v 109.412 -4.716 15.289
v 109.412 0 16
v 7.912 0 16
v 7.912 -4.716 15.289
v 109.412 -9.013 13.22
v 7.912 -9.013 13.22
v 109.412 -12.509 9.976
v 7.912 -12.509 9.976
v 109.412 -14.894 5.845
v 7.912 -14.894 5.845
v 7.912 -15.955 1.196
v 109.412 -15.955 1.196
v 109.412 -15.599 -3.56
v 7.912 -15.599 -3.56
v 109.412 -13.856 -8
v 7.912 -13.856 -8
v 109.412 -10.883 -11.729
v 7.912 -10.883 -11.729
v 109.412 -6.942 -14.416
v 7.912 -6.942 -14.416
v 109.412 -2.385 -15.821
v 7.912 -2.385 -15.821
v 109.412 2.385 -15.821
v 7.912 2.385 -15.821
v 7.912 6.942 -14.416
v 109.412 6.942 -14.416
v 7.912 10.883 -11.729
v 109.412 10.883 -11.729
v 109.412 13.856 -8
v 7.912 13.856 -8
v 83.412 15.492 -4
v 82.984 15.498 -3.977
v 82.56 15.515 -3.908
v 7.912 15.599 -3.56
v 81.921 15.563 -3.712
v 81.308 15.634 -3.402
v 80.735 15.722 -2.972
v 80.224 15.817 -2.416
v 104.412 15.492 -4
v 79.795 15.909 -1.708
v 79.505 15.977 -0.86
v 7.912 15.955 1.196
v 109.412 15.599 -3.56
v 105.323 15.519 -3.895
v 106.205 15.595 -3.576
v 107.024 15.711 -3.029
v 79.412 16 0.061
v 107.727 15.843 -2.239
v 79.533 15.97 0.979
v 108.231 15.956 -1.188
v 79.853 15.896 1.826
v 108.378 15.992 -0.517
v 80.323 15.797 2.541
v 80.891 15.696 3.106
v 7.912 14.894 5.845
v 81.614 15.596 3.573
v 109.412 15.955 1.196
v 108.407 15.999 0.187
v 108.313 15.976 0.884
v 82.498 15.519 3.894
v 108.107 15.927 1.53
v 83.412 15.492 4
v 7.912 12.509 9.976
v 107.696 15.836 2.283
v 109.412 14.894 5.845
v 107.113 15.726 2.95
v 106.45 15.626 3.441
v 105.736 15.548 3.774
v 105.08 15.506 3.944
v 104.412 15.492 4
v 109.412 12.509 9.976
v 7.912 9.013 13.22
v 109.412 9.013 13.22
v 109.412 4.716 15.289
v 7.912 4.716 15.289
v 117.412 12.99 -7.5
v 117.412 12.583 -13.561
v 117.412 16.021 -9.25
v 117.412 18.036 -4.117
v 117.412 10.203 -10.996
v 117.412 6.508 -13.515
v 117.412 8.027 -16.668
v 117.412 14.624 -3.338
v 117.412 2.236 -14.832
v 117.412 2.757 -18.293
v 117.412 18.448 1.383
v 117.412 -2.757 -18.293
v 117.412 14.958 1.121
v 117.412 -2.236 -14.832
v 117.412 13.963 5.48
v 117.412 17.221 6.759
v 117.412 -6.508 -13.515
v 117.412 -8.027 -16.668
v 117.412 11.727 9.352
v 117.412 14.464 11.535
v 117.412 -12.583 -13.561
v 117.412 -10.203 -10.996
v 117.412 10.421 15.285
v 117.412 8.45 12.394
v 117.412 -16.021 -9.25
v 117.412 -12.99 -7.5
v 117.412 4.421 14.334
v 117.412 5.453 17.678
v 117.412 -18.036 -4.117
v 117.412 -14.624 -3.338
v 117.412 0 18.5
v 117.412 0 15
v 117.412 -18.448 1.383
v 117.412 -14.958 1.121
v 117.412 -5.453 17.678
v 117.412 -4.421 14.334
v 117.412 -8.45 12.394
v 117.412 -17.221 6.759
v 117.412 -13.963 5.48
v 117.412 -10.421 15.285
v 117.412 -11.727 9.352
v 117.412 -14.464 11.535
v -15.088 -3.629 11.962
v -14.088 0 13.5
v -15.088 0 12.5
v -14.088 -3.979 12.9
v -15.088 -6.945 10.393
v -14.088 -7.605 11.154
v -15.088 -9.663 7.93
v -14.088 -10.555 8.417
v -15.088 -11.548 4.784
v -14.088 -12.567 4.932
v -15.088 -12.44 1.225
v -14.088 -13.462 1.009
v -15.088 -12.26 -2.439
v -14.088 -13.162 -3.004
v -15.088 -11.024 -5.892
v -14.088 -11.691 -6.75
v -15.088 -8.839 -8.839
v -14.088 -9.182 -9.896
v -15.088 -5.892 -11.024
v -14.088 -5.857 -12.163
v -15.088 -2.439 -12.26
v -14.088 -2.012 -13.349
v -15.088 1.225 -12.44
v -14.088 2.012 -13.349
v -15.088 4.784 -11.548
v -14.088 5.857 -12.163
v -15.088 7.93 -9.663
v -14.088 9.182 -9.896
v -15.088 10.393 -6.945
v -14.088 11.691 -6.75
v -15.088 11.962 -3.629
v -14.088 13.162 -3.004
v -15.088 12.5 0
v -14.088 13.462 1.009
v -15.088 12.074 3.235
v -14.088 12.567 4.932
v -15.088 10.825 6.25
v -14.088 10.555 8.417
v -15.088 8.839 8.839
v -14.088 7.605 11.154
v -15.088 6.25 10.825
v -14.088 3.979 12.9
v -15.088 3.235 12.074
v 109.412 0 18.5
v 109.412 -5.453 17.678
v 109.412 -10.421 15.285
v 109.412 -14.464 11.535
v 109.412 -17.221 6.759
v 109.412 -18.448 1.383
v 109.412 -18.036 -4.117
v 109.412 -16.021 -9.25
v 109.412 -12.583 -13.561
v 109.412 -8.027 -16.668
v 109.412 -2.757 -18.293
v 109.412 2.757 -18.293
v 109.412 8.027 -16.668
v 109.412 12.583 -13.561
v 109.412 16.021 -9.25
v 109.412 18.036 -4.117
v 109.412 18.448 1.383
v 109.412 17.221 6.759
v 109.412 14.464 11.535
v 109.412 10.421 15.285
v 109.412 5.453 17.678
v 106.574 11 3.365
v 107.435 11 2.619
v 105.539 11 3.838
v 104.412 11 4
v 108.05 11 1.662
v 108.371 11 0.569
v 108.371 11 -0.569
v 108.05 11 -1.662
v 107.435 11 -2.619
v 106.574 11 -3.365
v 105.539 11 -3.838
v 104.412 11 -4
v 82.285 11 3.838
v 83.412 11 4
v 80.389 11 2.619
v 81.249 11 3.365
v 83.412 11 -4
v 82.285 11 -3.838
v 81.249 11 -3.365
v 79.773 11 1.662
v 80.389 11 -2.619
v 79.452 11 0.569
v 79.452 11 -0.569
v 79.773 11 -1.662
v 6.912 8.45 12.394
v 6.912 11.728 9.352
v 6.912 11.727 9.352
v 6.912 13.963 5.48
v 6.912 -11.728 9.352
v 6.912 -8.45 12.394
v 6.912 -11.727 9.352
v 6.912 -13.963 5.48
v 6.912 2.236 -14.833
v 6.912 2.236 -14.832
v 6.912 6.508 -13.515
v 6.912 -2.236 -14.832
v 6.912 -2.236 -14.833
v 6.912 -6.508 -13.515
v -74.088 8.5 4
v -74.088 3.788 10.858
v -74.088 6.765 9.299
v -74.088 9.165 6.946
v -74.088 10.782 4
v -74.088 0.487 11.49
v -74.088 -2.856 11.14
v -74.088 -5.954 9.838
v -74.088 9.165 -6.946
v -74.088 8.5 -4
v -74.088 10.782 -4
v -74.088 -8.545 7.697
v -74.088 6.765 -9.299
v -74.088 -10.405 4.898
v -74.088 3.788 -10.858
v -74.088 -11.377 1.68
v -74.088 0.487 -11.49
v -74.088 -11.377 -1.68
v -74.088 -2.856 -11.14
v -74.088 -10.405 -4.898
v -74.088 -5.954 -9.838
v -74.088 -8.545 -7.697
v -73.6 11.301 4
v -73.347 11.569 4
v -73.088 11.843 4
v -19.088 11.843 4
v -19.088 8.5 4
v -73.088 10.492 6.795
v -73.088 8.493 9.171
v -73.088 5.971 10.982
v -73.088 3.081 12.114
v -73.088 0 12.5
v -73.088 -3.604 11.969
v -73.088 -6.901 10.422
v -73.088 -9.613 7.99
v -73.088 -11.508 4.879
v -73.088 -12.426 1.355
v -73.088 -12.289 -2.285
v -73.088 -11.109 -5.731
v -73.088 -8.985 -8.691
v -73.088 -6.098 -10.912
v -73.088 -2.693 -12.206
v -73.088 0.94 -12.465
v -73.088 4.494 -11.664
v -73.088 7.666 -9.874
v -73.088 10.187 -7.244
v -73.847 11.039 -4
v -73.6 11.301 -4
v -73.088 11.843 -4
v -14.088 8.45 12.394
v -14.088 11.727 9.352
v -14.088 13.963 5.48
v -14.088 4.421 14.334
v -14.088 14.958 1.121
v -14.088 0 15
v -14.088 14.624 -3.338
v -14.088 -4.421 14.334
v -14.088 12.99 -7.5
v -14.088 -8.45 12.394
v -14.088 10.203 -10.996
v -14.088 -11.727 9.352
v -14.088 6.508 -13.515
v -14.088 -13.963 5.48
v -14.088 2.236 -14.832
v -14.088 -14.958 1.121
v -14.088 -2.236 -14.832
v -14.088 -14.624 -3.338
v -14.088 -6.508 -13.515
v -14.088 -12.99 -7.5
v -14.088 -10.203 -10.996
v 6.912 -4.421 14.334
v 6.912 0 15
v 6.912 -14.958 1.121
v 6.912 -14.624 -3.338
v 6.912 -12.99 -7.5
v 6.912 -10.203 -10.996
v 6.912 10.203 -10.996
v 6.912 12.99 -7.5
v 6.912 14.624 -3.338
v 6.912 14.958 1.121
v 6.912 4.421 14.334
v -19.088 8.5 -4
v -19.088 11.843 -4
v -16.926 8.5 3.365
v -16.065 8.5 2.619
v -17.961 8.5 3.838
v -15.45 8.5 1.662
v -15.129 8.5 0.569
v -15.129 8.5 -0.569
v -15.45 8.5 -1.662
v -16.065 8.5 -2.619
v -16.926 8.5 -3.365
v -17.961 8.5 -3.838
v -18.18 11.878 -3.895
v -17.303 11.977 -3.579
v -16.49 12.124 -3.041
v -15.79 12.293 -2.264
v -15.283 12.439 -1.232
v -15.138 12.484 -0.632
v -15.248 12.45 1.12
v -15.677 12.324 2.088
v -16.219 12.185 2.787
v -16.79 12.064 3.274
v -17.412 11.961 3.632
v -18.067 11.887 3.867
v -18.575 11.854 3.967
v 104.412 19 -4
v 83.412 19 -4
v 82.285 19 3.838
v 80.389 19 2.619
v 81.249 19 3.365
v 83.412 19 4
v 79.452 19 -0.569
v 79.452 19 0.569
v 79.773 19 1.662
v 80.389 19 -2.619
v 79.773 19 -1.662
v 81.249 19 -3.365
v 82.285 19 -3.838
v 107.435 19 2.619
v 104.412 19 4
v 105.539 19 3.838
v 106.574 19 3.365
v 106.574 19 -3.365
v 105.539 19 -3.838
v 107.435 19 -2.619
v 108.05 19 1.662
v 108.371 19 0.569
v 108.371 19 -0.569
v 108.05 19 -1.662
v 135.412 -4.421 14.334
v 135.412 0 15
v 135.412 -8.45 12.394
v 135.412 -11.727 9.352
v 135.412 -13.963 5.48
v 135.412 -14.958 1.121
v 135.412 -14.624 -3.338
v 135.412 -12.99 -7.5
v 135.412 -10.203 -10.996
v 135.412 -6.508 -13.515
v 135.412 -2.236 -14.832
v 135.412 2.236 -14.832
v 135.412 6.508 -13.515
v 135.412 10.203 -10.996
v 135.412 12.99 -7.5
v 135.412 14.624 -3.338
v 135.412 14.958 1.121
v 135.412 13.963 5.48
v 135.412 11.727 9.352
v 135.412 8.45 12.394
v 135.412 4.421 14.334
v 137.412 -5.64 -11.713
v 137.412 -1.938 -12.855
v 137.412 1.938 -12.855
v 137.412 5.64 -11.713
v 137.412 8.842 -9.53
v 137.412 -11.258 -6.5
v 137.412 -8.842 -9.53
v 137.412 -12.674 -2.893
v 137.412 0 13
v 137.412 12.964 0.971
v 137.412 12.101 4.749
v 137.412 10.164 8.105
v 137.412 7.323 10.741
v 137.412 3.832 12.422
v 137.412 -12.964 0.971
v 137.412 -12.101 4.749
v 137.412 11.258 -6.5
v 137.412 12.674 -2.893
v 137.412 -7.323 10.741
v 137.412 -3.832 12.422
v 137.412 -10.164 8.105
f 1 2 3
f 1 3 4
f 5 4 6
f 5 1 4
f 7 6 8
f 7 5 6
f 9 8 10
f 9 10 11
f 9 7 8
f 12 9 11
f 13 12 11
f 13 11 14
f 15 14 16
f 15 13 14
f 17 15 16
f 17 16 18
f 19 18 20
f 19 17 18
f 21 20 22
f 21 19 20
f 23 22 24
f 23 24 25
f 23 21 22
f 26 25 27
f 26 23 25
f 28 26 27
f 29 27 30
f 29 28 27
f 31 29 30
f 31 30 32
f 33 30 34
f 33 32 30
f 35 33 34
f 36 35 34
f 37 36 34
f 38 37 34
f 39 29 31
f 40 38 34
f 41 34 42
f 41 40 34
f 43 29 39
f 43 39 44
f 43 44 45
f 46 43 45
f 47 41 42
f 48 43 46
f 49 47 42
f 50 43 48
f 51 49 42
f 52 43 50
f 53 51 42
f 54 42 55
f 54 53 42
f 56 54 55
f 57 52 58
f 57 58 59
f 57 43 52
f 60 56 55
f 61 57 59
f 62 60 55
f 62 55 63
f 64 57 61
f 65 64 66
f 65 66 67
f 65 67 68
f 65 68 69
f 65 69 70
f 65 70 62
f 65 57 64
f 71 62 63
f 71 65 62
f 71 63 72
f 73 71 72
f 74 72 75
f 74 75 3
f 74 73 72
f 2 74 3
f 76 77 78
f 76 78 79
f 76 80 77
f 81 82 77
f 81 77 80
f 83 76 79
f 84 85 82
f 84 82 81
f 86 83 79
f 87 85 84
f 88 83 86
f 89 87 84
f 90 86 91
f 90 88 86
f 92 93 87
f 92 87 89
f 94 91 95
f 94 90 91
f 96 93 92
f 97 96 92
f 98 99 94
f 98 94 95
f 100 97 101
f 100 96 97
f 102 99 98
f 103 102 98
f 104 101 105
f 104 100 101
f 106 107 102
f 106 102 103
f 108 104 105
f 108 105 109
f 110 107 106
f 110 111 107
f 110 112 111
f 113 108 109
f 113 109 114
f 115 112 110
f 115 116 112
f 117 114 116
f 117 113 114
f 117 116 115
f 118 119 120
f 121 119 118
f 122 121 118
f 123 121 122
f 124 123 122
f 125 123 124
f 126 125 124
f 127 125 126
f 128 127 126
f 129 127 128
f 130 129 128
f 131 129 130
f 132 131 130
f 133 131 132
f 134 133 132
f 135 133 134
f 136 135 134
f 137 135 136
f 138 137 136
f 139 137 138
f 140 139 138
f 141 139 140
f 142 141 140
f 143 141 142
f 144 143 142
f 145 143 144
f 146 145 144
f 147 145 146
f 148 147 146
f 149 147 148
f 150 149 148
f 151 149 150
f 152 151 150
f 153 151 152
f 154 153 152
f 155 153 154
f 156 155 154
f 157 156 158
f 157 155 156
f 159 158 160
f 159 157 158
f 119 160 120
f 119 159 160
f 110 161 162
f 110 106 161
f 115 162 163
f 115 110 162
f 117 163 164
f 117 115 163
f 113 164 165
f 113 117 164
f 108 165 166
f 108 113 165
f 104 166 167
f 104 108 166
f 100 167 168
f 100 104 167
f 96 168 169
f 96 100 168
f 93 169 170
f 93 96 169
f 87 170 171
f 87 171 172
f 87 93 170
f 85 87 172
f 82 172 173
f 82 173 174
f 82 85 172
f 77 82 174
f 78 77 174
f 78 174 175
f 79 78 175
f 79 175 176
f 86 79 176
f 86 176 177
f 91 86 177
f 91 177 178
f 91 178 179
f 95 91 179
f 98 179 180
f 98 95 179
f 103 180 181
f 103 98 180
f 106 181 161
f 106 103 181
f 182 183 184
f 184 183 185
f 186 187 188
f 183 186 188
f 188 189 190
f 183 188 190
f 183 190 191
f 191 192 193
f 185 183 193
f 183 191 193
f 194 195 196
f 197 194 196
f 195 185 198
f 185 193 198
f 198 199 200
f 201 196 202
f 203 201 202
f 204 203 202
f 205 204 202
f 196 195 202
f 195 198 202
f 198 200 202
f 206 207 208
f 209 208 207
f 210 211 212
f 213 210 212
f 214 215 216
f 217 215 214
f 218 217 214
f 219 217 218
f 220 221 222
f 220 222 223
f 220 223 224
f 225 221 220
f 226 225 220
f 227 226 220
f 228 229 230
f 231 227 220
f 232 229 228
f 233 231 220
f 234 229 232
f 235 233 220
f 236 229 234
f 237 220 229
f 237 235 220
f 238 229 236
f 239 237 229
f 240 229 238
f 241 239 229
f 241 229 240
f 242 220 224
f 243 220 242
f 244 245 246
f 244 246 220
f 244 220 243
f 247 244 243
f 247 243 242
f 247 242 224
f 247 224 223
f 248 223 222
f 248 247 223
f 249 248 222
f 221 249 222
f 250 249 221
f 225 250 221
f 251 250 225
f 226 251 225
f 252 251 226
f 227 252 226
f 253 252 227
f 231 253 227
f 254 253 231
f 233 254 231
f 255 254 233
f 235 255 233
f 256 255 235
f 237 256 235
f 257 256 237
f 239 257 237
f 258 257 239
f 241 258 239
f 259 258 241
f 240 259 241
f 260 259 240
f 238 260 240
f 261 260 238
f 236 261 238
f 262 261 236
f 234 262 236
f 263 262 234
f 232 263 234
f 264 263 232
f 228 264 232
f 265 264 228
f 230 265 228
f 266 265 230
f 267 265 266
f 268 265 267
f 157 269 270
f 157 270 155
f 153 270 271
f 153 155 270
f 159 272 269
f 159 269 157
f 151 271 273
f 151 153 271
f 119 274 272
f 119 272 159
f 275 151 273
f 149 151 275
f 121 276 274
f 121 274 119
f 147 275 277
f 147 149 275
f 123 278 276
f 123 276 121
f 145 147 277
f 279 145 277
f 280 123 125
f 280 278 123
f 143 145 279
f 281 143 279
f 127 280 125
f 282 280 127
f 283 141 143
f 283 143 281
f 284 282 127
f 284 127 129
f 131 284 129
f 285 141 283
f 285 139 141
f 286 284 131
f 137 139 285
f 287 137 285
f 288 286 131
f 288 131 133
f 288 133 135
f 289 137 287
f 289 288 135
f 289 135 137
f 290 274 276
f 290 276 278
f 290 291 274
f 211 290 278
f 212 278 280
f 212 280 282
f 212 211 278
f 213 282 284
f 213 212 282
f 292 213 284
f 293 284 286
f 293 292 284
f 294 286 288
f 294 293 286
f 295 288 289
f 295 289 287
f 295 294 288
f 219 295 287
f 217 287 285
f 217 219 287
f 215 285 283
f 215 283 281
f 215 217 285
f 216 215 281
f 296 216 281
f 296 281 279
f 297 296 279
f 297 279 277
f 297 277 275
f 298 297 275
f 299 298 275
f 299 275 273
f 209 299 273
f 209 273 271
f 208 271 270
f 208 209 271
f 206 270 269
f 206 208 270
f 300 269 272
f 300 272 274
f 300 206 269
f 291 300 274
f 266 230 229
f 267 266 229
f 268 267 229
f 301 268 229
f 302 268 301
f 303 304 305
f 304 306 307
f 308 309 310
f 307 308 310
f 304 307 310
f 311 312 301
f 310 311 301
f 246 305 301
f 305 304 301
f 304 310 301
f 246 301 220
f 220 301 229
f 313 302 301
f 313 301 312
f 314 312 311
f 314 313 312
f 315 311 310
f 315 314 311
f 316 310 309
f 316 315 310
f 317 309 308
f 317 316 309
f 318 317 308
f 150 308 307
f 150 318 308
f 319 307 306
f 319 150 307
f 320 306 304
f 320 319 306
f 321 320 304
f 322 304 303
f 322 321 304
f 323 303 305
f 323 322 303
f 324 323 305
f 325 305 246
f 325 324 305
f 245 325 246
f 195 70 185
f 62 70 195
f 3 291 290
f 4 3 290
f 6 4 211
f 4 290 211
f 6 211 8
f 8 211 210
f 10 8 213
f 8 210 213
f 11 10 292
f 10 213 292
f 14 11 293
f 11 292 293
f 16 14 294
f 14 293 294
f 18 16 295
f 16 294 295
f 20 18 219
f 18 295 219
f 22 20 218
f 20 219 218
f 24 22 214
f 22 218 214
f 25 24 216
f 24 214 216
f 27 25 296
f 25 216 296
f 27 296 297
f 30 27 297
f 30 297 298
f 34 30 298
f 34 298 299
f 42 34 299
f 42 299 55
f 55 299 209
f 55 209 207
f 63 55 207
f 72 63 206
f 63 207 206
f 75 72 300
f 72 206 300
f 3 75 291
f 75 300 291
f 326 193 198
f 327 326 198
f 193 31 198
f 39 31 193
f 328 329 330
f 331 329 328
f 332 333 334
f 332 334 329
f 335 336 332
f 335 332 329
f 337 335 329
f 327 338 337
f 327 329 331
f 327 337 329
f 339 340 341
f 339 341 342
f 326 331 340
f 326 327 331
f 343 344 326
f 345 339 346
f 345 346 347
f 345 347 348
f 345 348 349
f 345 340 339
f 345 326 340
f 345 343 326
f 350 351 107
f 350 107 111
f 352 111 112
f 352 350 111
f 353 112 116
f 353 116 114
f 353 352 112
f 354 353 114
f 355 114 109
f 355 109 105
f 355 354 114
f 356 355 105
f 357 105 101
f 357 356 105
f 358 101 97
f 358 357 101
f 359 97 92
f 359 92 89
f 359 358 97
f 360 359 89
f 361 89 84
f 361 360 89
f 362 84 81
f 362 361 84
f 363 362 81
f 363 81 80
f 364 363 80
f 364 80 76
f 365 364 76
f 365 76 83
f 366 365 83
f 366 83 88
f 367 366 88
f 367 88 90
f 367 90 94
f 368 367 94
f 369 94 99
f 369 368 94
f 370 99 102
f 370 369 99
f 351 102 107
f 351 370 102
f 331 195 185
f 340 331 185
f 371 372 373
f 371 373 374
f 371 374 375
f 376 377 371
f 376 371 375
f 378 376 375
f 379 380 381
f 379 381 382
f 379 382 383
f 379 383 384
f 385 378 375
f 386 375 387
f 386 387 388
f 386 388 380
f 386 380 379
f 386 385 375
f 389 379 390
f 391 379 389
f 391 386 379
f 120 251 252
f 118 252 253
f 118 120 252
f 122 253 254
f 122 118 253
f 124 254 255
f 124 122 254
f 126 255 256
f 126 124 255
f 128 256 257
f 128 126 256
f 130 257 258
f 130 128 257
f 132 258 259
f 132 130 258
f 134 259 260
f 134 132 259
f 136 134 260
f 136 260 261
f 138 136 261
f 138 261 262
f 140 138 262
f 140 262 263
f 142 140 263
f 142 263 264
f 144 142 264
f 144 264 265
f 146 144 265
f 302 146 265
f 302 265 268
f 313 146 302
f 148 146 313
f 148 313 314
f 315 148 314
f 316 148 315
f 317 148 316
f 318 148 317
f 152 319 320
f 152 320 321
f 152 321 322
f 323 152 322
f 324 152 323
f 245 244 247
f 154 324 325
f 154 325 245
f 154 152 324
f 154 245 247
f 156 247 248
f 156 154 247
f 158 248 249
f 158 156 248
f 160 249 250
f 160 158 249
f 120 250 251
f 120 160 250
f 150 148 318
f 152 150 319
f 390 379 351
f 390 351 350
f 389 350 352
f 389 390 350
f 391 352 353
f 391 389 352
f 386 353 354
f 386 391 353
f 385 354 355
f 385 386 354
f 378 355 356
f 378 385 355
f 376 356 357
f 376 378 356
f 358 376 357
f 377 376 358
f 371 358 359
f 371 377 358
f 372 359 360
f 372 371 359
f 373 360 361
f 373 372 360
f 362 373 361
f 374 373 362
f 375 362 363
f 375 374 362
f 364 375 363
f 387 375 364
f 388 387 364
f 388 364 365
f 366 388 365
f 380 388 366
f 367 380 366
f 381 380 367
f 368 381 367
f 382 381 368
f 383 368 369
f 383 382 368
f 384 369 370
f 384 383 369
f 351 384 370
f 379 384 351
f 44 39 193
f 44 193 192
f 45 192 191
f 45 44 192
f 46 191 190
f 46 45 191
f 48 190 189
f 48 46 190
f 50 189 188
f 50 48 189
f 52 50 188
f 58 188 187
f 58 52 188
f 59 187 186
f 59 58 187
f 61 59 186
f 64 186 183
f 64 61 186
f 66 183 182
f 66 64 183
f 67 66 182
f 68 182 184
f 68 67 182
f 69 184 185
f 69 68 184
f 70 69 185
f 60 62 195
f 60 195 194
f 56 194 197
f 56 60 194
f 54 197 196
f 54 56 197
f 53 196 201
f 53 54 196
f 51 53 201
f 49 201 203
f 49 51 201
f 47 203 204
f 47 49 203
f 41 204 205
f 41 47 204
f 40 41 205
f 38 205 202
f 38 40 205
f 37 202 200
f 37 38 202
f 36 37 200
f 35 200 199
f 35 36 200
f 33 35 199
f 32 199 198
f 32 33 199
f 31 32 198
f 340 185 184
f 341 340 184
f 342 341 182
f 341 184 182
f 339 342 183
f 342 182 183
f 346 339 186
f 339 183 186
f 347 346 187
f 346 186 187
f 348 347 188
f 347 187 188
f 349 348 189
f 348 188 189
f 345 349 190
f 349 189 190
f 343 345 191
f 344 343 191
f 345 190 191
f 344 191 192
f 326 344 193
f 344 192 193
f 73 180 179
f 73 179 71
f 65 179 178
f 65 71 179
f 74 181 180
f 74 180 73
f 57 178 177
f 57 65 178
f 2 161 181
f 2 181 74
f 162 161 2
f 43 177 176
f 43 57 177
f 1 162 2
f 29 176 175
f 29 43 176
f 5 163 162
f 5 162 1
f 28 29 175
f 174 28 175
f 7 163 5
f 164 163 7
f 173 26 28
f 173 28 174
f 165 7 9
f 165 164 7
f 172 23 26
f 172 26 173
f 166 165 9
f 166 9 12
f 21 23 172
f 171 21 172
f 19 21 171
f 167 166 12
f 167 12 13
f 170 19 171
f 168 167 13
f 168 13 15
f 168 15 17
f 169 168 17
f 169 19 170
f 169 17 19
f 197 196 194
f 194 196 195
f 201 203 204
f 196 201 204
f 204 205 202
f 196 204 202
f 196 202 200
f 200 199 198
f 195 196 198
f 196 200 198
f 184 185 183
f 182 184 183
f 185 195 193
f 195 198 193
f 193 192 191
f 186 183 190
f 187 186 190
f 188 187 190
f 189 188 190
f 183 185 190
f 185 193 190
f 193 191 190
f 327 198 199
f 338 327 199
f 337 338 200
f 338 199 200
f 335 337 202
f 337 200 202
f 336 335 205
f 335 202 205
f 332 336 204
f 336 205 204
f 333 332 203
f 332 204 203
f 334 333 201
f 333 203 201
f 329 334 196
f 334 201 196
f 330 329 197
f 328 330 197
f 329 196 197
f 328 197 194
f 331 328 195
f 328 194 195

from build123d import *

# Parameters (mm, degrees)
CUT_EXTRUDE1_START  = 12.5
CUT_EXTRUDE1_DEPTH  = 4
CHAMFER1_SIZE       = 2
CUT_EXTRUDE2_START  = 16
CUT_EXTRUDE2_DEPTH  = 5
BOSS_EXTRUDE1_DEPTH = 8
CHAMFER2_SIZE       = 1


with BuildPart() as part:
    # Sketch1 → Revolve1 (revolve)
    with BuildSketch(Plane.XY, mode=Mode.PRIVATE) as revolve1_sk:
        Polygon((-74.088237147, 0), (-74.088237147, 11.5), (-73.088237147, 12.5), (-15.088237147, 12.5), (-14.088237147, 13.5), (-14.088237147, 15), (6.911762853, 15), (6.911762853, 16), (109.411762853, 16), (109.411762853, 18.5), (117.411762853, 18.5), (117.411762853, 15), (137.411762853, 15), (137.411762853, 0), align=None)
    revolve(revolve1_sk.sketch.rotate(Axis((-81.144259733, 0, 0), (1, 0, 0)), 90), axis=Axis((-81.144259733, 0, 0), (1, 0, 0)))

    # Sketch2 → Cut-Extrude1 (cut)
    with BuildSketch(Plane(origin=(0, 0, 0), x_dir=(1, 0, 0), z_dir=(0, 1, 0)).offset(CUT_EXTRUDE1_START)):
        with BuildLine():
            Line((-74.748728331, 4), (-19.088237147, 4))
            ThreePointArc((-19.088237147, 4), (-15.088237147, 0), (-19.088237147, -4))
            Line((-19.088237147, -4), (-74.748728331, -4))
            ThreePointArc((-74.748728331, -4), (-78.748728331, 0), (-74.748728331, 4))
        make_face()
    extrude(amount=-CUT_EXTRUDE1_DEPTH, mode=Mode.SUBTRACT)

    # Chamfer1
    chamfer1_edges = [part.edges().sort_by_distance(p)[0] for p in [
        (137.411762853, 0, -15),
    ]]
    chamfer(chamfer1_edges, length=CHAMFER1_SIZE)

    # Sketch3 → Cut-Extrude2 (cut)
    with BuildSketch(Plane(origin=(0, 0, 0), x_dir=(1, 0, 0), z_dir=(0, 1, 0)).offset(CUT_EXTRUDE2_START)):
        with BuildLine():
            Line((83.411762853, 4), (104.411762853, 4))
            ThreePointArc((104.411762853, 4), (108.411762853, 0), (104.411762853, -4))
            Line((104.411762853, -4), (83.411762853, -4))
            ThreePointArc((83.411762853, -4), (79.411762853, 0), (83.411762853, 4))
        make_face()
    extrude(amount=-CUT_EXTRUDE2_DEPTH, mode=Mode.SUBTRACT)

    # Chamfer2
    chamfer2_edges = [part.edges().sort_by_distance(p)[0] for p in [
        (6.911762853, 0, -16),
    ]]
    chamfer(chamfer2_edges, length=CHAMFER2_SIZE - 0.0001)  # a hair under: the kernel refuses the full size


with BuildPart() as body_2:
    # Sketch4 → Boss-Extrude1 (new body)
    with BuildSketch(Plane(origin=(0, 11, 0), x_dir=(1, 0, 0), z_dir=(0, 1, 0))):
        with BuildLine():
            Line((83.411762853, -4), (104.411762853, -4))
            ThreePointArc((104.411762853, -4), (108.411762853, 0), (104.411762853, 4))
            Line((104.411762853, 4), (83.411762853, 4))
            ThreePointArc((83.411762853, 4), (79.411762853, 0), (83.411762853, -4))
        make_face()
    extrude(amount=BOSS_EXTRUDE1_DEPTH)


solid = Compound([part.part, body_2.part])
